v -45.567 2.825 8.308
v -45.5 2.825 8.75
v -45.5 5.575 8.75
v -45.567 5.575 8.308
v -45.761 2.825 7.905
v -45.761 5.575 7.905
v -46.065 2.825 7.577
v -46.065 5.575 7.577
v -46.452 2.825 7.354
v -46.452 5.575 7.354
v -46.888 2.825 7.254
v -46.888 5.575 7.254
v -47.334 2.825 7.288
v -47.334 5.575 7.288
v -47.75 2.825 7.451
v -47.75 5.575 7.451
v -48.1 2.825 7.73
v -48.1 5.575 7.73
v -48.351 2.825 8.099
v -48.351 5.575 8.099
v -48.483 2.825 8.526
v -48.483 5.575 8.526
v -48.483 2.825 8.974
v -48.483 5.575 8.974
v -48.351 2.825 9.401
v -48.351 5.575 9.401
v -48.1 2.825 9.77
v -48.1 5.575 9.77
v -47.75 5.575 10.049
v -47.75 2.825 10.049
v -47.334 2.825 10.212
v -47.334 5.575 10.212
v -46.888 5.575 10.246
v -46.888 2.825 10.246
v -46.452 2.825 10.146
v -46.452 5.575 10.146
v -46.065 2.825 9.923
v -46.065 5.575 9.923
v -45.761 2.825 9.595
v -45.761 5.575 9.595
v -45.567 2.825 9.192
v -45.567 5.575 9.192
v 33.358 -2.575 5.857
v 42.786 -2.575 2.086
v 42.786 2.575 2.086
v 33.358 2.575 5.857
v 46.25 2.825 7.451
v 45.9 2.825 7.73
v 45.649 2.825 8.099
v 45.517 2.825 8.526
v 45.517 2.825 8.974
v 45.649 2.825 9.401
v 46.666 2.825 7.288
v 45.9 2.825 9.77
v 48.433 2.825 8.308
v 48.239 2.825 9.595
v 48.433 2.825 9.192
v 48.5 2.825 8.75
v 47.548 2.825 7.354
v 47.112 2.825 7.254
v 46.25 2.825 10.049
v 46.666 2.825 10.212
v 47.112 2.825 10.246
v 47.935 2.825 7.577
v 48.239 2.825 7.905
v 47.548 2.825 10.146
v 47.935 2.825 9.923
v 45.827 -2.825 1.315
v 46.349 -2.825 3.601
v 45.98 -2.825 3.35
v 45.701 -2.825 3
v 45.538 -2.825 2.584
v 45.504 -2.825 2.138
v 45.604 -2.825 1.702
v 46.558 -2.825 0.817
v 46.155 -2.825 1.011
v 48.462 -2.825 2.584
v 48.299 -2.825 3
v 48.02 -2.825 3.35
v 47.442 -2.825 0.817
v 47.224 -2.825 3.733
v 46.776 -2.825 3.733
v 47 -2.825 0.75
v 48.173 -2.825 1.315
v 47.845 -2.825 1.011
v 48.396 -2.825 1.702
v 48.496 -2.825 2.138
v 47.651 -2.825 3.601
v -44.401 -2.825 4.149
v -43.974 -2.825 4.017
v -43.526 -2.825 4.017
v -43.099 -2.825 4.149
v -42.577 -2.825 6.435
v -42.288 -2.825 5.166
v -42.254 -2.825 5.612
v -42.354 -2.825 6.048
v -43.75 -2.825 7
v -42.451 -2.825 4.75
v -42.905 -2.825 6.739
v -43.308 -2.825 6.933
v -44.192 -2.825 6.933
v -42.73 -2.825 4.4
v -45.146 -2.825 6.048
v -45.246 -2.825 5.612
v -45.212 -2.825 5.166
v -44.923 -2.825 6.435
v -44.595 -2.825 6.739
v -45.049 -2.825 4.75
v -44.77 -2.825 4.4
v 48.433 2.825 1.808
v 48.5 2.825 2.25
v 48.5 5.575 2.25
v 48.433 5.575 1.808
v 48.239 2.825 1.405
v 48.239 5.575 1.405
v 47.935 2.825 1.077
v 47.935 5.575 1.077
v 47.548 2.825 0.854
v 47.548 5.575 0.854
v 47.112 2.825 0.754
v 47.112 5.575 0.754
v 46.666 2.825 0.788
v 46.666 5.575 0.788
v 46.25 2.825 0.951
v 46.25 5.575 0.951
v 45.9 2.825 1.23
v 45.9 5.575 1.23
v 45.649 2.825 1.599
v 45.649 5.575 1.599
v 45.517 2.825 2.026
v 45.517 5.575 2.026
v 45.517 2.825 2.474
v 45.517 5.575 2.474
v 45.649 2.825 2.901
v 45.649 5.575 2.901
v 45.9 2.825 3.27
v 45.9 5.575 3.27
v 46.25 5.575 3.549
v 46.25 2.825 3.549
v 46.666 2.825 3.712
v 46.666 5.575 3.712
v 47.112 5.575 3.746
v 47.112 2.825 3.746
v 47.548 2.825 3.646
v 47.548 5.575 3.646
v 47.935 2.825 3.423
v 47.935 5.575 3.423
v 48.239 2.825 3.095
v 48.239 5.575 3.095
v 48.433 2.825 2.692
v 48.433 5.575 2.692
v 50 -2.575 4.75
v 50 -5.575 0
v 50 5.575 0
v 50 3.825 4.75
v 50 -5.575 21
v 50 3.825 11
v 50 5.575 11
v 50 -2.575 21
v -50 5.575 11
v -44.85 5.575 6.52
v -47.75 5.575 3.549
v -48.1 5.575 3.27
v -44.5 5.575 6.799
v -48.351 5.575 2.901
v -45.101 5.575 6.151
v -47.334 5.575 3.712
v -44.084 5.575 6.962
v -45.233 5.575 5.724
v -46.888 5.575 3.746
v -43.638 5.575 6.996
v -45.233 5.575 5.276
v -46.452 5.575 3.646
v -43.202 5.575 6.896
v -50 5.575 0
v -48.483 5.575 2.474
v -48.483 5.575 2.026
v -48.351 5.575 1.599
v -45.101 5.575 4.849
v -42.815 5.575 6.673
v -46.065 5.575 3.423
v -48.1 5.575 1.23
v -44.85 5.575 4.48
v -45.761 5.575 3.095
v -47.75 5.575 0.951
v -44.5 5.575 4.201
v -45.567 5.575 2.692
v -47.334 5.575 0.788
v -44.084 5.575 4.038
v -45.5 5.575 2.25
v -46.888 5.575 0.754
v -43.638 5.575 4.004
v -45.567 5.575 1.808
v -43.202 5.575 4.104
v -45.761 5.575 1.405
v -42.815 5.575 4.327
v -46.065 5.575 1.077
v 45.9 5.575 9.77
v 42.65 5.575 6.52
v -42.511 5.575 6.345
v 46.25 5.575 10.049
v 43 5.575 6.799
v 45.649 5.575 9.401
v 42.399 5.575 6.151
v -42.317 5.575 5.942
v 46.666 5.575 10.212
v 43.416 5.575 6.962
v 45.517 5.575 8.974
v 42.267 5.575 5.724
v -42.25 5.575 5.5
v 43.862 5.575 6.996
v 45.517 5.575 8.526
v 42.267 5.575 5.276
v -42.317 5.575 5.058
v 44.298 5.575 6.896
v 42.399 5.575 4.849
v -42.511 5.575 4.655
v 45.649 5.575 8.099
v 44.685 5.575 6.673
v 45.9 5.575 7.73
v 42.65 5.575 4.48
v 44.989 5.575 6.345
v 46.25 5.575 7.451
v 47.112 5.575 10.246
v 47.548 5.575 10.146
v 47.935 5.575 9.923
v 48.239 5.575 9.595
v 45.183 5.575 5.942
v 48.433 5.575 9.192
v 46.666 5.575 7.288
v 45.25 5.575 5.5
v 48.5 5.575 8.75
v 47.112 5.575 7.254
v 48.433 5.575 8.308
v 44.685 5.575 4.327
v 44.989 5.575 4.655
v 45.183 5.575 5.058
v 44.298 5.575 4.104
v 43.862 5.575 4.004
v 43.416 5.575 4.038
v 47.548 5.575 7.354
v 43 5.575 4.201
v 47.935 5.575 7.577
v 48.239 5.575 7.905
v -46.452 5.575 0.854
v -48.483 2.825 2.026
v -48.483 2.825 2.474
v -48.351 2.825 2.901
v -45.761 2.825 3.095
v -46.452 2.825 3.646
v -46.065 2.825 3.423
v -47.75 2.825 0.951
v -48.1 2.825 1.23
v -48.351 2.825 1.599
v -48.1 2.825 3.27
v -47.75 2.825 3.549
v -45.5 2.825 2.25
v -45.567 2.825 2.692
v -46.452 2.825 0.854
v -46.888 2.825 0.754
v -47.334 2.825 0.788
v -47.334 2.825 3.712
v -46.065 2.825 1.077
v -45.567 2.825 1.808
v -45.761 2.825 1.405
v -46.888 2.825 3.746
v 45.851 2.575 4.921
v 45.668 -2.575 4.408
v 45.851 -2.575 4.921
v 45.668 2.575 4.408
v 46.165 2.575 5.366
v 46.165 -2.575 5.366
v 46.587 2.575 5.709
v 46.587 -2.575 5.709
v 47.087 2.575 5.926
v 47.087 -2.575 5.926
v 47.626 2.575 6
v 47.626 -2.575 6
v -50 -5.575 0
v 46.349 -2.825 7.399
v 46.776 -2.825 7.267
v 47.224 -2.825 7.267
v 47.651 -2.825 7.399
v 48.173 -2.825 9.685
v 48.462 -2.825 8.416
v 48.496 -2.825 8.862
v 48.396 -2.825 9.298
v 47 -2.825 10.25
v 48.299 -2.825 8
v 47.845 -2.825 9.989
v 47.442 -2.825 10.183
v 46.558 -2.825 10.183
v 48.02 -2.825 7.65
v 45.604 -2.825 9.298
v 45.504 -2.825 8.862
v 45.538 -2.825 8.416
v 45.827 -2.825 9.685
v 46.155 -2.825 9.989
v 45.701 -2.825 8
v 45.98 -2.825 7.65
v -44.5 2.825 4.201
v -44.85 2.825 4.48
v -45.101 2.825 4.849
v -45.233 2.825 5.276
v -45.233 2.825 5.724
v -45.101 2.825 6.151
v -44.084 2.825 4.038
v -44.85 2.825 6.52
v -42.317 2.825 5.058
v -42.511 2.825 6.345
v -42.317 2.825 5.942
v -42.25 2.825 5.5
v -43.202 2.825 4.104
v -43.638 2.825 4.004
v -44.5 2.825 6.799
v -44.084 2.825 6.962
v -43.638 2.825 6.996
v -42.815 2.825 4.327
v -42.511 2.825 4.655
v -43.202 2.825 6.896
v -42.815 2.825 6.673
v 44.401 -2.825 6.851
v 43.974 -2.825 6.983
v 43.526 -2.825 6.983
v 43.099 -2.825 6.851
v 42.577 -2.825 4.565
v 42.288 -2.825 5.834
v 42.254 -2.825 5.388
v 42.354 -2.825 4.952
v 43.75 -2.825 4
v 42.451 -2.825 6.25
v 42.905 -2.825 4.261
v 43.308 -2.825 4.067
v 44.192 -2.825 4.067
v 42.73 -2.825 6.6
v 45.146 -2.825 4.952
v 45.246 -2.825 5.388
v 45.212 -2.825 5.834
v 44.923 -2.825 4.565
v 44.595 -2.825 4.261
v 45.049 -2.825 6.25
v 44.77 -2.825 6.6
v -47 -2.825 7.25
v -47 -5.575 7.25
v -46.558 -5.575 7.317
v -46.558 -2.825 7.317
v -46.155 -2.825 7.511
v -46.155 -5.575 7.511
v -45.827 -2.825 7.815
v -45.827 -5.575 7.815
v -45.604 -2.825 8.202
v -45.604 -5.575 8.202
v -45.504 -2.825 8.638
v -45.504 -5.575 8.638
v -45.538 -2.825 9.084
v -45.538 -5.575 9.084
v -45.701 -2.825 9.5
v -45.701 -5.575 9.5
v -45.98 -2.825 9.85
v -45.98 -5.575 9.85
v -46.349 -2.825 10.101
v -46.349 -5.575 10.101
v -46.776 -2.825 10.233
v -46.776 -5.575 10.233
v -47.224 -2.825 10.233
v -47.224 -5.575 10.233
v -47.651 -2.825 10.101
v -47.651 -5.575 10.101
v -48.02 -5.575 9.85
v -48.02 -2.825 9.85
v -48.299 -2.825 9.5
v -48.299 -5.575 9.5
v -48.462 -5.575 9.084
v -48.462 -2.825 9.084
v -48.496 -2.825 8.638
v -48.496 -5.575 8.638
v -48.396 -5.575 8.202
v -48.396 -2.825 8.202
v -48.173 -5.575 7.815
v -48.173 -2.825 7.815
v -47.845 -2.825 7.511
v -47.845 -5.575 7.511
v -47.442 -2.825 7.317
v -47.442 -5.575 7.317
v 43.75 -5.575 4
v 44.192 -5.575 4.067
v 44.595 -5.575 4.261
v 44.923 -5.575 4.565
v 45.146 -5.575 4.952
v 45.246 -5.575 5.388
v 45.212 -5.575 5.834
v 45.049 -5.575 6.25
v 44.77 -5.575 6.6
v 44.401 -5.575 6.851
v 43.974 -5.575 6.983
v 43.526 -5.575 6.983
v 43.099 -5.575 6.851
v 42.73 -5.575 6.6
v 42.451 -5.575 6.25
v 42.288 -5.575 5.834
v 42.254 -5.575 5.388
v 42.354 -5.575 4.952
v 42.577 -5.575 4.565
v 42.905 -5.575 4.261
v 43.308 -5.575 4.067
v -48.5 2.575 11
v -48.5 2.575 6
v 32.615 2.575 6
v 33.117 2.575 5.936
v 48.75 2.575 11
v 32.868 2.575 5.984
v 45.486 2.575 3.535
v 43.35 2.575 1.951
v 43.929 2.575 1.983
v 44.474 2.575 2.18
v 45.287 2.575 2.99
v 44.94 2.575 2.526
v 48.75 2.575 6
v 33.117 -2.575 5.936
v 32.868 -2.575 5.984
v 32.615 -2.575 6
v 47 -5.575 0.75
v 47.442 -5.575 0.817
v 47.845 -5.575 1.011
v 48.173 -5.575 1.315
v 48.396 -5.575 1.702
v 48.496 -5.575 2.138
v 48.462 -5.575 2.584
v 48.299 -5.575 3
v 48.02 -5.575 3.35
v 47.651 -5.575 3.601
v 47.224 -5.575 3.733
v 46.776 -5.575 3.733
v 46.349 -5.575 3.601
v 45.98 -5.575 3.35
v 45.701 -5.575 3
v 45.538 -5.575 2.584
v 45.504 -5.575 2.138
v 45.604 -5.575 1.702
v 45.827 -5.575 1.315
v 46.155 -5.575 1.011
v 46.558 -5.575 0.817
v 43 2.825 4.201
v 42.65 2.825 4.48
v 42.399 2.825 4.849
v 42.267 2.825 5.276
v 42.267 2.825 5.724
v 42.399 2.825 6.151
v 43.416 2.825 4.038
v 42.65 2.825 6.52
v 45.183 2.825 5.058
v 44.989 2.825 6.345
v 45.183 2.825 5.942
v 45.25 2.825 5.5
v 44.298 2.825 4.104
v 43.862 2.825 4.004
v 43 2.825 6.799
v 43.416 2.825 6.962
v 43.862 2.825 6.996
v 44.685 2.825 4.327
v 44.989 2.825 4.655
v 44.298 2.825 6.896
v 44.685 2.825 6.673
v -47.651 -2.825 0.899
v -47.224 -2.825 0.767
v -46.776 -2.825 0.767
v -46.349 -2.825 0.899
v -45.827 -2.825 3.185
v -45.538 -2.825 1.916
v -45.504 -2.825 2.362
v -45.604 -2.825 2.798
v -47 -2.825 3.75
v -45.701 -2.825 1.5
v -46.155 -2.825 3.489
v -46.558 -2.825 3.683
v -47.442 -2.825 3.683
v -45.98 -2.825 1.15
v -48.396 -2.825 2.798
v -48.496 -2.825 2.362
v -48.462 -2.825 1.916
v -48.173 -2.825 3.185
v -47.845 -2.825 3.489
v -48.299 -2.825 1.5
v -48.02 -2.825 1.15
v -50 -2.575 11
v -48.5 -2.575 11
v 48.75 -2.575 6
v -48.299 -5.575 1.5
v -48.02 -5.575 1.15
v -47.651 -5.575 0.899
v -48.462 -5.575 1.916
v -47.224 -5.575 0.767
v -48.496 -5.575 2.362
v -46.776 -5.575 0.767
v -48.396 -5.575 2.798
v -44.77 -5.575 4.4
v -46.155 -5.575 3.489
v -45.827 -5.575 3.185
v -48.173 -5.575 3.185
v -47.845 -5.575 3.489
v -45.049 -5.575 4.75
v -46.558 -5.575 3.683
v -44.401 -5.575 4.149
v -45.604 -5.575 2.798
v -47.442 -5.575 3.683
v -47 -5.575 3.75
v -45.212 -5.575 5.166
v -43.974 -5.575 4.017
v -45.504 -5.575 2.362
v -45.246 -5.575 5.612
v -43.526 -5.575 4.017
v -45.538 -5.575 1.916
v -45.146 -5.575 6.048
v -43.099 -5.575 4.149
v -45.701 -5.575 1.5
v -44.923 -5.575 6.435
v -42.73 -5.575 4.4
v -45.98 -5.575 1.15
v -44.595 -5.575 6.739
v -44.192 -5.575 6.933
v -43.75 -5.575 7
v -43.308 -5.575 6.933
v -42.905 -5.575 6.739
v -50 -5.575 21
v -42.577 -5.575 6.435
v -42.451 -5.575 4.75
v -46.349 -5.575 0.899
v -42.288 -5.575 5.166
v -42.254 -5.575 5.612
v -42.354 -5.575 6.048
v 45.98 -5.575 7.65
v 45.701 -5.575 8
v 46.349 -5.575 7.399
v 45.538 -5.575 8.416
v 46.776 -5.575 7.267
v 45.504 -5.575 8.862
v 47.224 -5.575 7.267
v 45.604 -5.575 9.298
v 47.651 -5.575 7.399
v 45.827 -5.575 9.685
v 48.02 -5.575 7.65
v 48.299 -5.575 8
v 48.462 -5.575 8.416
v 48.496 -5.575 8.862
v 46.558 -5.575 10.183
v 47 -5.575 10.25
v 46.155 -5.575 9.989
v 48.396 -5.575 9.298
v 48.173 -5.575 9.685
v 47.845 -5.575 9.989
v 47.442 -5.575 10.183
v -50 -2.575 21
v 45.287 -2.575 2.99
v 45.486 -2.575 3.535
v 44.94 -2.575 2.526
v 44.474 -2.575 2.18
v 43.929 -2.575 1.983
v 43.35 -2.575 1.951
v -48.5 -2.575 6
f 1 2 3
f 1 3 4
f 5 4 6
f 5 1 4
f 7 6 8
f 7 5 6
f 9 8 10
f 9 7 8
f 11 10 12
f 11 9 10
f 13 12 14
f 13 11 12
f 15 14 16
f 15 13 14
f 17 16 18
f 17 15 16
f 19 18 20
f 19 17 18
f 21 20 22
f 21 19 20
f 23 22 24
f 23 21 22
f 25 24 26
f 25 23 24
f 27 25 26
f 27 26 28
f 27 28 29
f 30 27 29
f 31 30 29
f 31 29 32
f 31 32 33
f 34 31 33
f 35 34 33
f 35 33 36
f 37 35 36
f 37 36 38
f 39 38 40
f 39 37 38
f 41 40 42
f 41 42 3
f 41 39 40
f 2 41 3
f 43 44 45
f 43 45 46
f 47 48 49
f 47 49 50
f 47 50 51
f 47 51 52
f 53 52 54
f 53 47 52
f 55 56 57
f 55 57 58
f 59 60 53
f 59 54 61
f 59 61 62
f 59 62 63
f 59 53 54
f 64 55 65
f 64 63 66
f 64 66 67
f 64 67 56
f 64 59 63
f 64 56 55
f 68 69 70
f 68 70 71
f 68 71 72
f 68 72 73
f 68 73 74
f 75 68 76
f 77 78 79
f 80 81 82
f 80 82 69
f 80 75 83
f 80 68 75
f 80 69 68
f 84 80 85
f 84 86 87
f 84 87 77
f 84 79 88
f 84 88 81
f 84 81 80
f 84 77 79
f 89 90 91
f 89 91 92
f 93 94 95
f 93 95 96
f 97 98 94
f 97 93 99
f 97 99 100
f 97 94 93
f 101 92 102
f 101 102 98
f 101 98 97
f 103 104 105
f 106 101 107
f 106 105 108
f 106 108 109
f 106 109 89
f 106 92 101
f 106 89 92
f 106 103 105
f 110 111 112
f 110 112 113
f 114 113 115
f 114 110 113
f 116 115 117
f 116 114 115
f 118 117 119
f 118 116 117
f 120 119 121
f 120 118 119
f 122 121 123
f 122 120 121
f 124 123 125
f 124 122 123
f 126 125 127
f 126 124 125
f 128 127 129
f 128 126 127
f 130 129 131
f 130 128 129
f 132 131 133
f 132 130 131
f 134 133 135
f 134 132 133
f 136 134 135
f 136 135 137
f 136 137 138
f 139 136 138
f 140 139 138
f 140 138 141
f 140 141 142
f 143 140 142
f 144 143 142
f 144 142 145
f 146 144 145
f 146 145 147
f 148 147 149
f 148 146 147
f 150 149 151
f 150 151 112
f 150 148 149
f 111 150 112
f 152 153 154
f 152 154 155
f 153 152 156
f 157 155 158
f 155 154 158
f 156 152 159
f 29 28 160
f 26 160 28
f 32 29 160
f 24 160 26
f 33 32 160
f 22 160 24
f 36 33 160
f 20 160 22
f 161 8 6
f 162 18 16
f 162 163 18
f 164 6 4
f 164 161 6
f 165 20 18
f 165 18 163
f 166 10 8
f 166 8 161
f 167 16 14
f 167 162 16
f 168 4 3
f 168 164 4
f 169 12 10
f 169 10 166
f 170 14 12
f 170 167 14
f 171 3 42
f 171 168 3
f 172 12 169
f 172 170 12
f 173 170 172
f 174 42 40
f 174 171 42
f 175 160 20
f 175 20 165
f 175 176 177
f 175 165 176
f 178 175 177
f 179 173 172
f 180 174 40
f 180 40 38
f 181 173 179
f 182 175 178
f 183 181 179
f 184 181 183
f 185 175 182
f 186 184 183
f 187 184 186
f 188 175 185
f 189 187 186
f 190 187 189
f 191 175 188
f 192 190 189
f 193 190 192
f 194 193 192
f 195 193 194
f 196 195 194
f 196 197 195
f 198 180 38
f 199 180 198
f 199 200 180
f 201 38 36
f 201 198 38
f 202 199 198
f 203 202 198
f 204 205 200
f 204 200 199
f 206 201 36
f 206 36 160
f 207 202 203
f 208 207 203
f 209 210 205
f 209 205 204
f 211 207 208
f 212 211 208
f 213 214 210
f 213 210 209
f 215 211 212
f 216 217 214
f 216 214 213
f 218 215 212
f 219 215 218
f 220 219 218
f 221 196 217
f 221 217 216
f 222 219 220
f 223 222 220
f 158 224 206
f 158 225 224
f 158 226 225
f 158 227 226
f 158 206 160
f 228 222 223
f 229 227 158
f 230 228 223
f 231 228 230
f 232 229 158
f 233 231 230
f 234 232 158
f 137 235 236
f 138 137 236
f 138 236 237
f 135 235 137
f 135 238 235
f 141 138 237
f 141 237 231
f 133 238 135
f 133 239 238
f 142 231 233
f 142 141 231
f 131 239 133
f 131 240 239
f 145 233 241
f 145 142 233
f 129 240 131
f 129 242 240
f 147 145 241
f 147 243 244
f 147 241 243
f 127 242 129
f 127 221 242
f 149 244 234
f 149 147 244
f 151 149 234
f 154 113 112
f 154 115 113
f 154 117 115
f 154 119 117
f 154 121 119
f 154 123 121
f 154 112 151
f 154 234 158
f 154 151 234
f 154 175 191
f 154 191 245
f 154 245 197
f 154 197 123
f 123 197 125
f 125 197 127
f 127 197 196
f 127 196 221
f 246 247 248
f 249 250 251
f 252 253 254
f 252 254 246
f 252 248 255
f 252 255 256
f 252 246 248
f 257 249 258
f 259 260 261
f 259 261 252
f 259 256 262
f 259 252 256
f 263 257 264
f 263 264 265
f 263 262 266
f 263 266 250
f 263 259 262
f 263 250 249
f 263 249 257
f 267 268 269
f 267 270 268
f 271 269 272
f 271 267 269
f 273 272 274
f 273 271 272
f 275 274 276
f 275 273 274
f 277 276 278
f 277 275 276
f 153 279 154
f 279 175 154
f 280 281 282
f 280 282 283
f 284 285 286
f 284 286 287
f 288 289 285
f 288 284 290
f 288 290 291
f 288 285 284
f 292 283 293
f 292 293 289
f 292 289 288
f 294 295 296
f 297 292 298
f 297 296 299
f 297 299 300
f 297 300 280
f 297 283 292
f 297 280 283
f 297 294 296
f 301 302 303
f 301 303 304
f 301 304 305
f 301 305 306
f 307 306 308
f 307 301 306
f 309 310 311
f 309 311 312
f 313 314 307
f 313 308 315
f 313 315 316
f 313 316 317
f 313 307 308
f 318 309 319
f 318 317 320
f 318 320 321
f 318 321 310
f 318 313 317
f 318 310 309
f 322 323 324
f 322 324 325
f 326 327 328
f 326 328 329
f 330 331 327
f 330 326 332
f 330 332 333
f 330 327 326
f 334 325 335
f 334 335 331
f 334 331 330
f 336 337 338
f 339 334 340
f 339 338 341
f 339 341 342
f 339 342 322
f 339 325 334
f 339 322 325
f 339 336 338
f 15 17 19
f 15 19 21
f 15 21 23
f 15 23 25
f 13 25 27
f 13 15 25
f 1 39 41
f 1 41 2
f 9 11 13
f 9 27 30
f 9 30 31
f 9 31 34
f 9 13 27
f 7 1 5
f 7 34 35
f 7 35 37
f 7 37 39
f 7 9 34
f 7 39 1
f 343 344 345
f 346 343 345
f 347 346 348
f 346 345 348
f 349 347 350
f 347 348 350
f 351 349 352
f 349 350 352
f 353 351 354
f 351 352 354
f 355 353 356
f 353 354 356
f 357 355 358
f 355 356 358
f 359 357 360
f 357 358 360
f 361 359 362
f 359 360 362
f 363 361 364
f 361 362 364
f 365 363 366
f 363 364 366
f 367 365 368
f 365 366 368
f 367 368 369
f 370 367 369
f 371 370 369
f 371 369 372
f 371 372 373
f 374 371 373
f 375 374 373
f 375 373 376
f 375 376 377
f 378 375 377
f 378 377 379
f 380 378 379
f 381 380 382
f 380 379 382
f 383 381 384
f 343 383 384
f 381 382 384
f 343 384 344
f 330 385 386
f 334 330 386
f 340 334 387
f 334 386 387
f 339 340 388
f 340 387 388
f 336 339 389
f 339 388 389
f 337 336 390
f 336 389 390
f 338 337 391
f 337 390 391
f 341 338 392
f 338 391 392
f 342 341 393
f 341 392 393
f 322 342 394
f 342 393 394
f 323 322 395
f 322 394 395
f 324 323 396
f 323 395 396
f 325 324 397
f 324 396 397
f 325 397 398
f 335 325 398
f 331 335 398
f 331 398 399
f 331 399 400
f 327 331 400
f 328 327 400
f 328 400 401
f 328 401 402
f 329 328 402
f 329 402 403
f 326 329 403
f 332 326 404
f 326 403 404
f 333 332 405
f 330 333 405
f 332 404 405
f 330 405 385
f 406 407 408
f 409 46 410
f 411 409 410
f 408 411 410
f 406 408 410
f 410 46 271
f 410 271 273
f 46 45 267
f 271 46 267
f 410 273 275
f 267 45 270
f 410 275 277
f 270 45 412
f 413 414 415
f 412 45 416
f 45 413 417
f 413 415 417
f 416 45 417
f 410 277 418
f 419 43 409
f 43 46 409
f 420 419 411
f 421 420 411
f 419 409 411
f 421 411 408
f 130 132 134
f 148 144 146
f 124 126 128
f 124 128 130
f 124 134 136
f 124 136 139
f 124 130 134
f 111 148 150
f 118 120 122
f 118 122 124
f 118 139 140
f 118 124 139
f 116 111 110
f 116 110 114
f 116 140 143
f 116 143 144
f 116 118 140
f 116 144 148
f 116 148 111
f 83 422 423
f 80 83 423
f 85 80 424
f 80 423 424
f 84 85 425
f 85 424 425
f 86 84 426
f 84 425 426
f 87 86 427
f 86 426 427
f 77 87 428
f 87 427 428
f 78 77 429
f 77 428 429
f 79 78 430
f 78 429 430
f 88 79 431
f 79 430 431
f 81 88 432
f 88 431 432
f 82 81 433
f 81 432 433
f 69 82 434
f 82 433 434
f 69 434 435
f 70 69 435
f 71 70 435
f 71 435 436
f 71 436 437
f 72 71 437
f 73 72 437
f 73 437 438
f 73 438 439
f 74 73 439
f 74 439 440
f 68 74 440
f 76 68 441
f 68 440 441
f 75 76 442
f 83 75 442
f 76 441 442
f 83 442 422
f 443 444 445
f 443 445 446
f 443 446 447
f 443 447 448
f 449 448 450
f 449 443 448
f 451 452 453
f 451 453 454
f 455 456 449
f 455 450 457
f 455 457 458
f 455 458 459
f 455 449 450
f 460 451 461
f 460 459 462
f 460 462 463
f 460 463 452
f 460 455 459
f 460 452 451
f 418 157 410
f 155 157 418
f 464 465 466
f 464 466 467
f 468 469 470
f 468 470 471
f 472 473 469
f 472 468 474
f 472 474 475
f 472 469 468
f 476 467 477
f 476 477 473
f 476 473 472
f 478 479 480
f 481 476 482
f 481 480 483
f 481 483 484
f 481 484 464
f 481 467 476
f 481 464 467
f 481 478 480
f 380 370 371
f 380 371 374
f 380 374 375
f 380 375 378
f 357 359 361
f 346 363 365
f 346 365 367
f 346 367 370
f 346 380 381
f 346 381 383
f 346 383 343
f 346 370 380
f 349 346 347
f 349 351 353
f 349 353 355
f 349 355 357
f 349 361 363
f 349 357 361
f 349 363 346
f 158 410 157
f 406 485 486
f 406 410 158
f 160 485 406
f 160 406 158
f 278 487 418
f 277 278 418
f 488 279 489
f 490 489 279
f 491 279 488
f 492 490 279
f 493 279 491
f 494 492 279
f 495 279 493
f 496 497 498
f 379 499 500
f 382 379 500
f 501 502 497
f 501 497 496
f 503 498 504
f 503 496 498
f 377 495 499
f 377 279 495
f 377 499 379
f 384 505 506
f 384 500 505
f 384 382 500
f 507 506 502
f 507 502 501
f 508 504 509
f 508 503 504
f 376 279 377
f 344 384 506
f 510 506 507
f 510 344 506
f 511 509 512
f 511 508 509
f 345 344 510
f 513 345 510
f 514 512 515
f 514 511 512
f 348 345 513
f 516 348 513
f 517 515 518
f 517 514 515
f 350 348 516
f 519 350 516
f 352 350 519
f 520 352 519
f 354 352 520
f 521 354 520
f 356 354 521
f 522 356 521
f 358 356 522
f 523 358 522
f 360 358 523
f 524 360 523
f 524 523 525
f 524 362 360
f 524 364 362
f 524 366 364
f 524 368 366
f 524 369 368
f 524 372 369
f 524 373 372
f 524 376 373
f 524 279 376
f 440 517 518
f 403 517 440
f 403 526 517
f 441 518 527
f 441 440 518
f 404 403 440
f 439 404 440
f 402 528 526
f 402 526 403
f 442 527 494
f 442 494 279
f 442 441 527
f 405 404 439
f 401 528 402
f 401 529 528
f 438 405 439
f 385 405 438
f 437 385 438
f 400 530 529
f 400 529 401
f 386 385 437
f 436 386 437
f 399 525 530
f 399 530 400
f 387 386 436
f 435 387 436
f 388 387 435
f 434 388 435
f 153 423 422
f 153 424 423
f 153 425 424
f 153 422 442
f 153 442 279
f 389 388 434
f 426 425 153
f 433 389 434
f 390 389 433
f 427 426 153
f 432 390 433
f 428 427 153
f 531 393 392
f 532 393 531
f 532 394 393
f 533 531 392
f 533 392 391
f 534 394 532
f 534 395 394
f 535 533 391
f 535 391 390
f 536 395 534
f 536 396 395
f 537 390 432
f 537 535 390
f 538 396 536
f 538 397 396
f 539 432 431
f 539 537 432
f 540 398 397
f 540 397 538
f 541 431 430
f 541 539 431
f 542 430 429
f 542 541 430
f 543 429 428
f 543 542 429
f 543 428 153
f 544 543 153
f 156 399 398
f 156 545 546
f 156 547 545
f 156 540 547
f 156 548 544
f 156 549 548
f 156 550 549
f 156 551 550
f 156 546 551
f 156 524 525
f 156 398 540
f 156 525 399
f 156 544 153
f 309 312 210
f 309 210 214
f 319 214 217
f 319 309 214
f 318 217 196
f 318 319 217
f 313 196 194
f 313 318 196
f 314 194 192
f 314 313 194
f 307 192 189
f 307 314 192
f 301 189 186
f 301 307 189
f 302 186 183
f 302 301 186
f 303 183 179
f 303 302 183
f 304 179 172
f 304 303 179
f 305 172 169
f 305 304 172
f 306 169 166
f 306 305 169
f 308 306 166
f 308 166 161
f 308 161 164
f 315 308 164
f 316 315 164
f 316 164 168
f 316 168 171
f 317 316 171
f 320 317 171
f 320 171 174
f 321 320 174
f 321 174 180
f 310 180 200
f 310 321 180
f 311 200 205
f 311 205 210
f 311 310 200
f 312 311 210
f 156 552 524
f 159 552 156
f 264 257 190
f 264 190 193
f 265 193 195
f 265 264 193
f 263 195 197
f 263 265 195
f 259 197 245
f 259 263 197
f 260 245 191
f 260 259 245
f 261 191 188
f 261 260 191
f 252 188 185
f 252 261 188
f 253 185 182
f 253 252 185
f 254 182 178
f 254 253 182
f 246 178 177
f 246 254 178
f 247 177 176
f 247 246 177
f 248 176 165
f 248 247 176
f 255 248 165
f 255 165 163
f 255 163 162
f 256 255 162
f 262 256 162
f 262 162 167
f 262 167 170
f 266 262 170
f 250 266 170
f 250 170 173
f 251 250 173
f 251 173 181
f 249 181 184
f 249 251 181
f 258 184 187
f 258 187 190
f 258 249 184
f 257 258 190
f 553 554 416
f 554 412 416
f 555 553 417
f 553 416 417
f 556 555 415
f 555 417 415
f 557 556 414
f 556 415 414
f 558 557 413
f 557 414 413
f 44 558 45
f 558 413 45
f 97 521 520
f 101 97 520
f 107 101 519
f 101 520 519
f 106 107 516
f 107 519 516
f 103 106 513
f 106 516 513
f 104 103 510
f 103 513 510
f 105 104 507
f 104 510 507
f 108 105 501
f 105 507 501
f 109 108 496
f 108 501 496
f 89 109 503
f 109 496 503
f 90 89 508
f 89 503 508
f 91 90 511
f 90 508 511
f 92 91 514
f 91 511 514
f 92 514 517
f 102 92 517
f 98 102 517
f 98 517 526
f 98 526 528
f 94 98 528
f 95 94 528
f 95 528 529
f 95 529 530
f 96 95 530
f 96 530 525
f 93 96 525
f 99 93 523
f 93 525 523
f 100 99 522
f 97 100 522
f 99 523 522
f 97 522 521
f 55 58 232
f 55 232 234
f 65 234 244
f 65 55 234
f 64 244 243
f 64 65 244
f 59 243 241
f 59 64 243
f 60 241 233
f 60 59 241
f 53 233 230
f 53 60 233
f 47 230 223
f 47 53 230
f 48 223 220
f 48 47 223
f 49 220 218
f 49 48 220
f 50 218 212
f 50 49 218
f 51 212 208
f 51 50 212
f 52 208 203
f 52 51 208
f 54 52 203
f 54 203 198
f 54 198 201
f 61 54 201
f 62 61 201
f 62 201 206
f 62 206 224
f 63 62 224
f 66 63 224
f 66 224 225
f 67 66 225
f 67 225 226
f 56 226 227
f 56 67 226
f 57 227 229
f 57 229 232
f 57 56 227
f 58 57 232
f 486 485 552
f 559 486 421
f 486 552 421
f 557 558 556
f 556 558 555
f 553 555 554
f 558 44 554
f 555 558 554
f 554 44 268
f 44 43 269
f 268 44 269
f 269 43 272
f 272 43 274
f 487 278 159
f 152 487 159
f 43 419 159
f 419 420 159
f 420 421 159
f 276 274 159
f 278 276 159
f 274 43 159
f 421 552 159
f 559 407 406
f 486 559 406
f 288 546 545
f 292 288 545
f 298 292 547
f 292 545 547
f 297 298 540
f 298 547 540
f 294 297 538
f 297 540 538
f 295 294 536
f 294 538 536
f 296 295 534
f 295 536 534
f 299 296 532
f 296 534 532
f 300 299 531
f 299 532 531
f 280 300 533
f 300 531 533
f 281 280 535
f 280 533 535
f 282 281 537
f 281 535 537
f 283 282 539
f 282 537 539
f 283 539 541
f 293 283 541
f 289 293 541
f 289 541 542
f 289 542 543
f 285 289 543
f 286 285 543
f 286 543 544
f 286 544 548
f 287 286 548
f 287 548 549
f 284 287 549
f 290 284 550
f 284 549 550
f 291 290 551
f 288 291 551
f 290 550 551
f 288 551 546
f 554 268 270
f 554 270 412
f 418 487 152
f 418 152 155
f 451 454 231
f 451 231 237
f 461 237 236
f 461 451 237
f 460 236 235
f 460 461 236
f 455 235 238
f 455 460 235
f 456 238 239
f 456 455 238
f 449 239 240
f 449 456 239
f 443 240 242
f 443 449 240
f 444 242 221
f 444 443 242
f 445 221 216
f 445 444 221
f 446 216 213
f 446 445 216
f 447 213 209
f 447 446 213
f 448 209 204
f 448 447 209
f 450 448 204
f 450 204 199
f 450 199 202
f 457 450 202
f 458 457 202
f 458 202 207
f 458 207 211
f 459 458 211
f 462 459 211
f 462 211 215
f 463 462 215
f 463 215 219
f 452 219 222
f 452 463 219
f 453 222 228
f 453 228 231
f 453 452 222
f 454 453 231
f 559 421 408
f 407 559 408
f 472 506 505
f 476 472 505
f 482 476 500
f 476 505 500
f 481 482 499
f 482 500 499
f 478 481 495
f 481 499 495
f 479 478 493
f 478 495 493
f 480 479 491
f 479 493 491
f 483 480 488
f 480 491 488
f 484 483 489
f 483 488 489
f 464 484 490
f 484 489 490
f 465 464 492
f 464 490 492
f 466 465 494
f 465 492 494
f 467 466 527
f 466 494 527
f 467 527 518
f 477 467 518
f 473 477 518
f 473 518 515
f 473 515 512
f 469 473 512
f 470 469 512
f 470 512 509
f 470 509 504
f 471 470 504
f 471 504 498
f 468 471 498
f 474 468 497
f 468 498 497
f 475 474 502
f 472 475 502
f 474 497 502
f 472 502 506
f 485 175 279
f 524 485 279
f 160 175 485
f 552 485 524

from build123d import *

# Parameters (mm, degrees)
ESBO_O1_W                = 6
ESBO_O1_H                = 5.15
RESSALTO_EXTRUS_O1_DEPTH = 50
CORTE_EXTRUS_O5_START    = -2.575
CORTE_EXTRUS_O5_DEPTH    = 5.15
FILETE2_R                = 2
SKETCH1_W                = 100
SKETCH1_H                = 11
BOSS_EXTRUDE1_DEPTH      = 3
SKETCH2_W                = 100
SKETCH2_H                = 21
BOSS_EXTRUDE2_DEPTH      = 3
FILLET1_R                = 2
FILLET2_R                = 2
CUT_EXTRUDE1_START       = 2.825
CUT_EXTRUDE1_OUTLINE_R   = 1.5
CUT_EXTRUDE1_DEPTH       = 2.75
SKETCH6_W                = 5
SKETCH6_H                = 5.15
BOSS_EXTRUDE4_DEPTH      = 1.5
SKETCH8_R                = 1.5
CUT_EXTRUDE2_DEPTH       = 2.75
CHAMFER2_SIZE            = 1.25


# Read off the part's stored shape, not the designer's step: Corte-extrusão5, Cut-Extrude1
with BuildPart() as part:
    # Esboço1 → Ressalto-extrusão1 (new, symmetric)
    with BuildSketch(Plane(origin=(0, 0, 0), x_dir=(0, 0, -1), z_dir=(1, 0, 0))):
        with Locations((-3, 0)):
            Rectangle(ESBO_O1_W, ESBO_O1_H)
    extrude(amount=RESSALTO_EXTRUS_O1_DEPTH, both=True)

    # Corte-extrusão5 outline → Corte-extrusão5 (cut)
    with BuildSketch(Plane(origin=(0, 0, 0), x_dir=(1, 0, 0), z_dir=(0, 1, 0)).offset(CORTE_EXTRUS_O5_START)):
        Polygon((46, -6), (45, -1.2), (33, -6), align=None)
    extrude(amount=CORTE_EXTRUS_O5_DEPTH, mode=Mode.SUBTRACT)

    # Filete2
    filete2_edges = [part.edges().sort_by_distance(p)[0] for p in [
        (46, 0, 6),
    ]]
    fillet(filete2_edges, radius=FILETE2_R)

    # Sketch1 → Boss-Extrude1 (add)
    with BuildSketch(Plane(origin=(0, 2.575, 0), x_dir=(1, 0, 0), z_dir=(0, 1, 0))):
        with Locations((0, -5.5)):
            Rectangle(SKETCH1_W, SKETCH1_H)
    extrude(amount=BOSS_EXTRUDE1_DEPTH)

    # Sketch2 → Boss-Extrude2 (add)
    with BuildSketch(Plane.XZ.offset(2.575)):
        with Locations((0, 10.5)):
            Rectangle(SKETCH2_W, SKETCH2_H)
    extrude(amount=BOSS_EXTRUDE2_DEPTH)

    # Fillet1
    fillet1_edges = [part.edges().sort_by_distance(p)[0] for p in [
        (45, 0, 1.2),
    ]]
    fillet(fillet1_edges, radius=FILLET1_R)

    # Fillet2
    fillet2_edges = [part.edges().sort_by_distance(p)[0] for p in [
        (33, 0, 6),
    ]]
    fillet(fillet2_edges, radius=FILLET2_R)

    # Cut-Extrude1 outline → Cut-Extrude1 (cut)
    with BuildSketch(Plane(origin=(0, 0, 0), x_dir=(1, 0, 0), z_dir=(0, 1, 0)).offset(CUT_EXTRUDE1_START)):
        with Locations((-43.75, -5.5)):
            Circle(CUT_EXTRUDE1_OUTLINE_R)
        with Locations((43.75, -5.5)):
            Circle(CUT_EXTRUDE1_OUTLINE_R)
        with Locations((47, -2.25)):
            Circle(CUT_EXTRUDE1_OUTLINE_R)
        with Locations((47, -8.75)):
            Circle(CUT_EXTRUDE1_OUTLINE_R)
        with Locations((-47, -8.75)):
            Circle(CUT_EXTRUDE1_OUTLINE_R)
        with Locations((-47, -2.25)):
            Circle(CUT_EXTRUDE1_OUTLINE_R)
    extrude(amount=CUT_EXTRUDE1_DEPTH, mode=Mode.SUBTRACT)

    # Sketch6 → Boss-Extrude4 (add)
    with BuildSketch(Plane.ZY.offset(50)):
        with Locations((8.5, 0)):
            Rectangle(SKETCH6_W, SKETCH6_H)
    extrude(amount=-BOSS_EXTRUDE4_DEPTH)

    # Sketch8 → Cut-Extrude2 (cut)
    with BuildSketch(Plane.XZ.offset(5.575)):
        with Locations(Location((47, 8.75, 0), (0, 0, 90))):
            Circle(SKETCH8_R)
        with Locations(Location((43.75, 5.5, 0), (0, 0, 270))):
            Circle(SKETCH8_R)
        with Locations(Location((47, 2.25, 0), (0, 0, 270))):
            Circle(SKETCH8_R)
        with Locations(Location((-47, 8.75, 0), (0, 0, 270))):
            Circle(SKETCH8_R)
        with Locations(Location((-43.75, 5.5, 0), (0, 0, 90))):
            Circle(SKETCH8_R)
        with Locations(Location((-47, 2.25, 0), (0, 0, 90))):
            Circle(SKETCH8_R)
    extrude(amount=-CUT_EXTRUDE2_DEPTH, mode=Mode.SUBTRACT)

    # Chamfer2
    chamfer2_edges = [part.edges().sort_by_distance(p)[0] for p in [
        (50, 2.575, 8.5),
        (50, 0, 6),
    ]]
    chamfer(chamfer2_edges, length=CHAMFER2_SIZE)


solid = part.part
